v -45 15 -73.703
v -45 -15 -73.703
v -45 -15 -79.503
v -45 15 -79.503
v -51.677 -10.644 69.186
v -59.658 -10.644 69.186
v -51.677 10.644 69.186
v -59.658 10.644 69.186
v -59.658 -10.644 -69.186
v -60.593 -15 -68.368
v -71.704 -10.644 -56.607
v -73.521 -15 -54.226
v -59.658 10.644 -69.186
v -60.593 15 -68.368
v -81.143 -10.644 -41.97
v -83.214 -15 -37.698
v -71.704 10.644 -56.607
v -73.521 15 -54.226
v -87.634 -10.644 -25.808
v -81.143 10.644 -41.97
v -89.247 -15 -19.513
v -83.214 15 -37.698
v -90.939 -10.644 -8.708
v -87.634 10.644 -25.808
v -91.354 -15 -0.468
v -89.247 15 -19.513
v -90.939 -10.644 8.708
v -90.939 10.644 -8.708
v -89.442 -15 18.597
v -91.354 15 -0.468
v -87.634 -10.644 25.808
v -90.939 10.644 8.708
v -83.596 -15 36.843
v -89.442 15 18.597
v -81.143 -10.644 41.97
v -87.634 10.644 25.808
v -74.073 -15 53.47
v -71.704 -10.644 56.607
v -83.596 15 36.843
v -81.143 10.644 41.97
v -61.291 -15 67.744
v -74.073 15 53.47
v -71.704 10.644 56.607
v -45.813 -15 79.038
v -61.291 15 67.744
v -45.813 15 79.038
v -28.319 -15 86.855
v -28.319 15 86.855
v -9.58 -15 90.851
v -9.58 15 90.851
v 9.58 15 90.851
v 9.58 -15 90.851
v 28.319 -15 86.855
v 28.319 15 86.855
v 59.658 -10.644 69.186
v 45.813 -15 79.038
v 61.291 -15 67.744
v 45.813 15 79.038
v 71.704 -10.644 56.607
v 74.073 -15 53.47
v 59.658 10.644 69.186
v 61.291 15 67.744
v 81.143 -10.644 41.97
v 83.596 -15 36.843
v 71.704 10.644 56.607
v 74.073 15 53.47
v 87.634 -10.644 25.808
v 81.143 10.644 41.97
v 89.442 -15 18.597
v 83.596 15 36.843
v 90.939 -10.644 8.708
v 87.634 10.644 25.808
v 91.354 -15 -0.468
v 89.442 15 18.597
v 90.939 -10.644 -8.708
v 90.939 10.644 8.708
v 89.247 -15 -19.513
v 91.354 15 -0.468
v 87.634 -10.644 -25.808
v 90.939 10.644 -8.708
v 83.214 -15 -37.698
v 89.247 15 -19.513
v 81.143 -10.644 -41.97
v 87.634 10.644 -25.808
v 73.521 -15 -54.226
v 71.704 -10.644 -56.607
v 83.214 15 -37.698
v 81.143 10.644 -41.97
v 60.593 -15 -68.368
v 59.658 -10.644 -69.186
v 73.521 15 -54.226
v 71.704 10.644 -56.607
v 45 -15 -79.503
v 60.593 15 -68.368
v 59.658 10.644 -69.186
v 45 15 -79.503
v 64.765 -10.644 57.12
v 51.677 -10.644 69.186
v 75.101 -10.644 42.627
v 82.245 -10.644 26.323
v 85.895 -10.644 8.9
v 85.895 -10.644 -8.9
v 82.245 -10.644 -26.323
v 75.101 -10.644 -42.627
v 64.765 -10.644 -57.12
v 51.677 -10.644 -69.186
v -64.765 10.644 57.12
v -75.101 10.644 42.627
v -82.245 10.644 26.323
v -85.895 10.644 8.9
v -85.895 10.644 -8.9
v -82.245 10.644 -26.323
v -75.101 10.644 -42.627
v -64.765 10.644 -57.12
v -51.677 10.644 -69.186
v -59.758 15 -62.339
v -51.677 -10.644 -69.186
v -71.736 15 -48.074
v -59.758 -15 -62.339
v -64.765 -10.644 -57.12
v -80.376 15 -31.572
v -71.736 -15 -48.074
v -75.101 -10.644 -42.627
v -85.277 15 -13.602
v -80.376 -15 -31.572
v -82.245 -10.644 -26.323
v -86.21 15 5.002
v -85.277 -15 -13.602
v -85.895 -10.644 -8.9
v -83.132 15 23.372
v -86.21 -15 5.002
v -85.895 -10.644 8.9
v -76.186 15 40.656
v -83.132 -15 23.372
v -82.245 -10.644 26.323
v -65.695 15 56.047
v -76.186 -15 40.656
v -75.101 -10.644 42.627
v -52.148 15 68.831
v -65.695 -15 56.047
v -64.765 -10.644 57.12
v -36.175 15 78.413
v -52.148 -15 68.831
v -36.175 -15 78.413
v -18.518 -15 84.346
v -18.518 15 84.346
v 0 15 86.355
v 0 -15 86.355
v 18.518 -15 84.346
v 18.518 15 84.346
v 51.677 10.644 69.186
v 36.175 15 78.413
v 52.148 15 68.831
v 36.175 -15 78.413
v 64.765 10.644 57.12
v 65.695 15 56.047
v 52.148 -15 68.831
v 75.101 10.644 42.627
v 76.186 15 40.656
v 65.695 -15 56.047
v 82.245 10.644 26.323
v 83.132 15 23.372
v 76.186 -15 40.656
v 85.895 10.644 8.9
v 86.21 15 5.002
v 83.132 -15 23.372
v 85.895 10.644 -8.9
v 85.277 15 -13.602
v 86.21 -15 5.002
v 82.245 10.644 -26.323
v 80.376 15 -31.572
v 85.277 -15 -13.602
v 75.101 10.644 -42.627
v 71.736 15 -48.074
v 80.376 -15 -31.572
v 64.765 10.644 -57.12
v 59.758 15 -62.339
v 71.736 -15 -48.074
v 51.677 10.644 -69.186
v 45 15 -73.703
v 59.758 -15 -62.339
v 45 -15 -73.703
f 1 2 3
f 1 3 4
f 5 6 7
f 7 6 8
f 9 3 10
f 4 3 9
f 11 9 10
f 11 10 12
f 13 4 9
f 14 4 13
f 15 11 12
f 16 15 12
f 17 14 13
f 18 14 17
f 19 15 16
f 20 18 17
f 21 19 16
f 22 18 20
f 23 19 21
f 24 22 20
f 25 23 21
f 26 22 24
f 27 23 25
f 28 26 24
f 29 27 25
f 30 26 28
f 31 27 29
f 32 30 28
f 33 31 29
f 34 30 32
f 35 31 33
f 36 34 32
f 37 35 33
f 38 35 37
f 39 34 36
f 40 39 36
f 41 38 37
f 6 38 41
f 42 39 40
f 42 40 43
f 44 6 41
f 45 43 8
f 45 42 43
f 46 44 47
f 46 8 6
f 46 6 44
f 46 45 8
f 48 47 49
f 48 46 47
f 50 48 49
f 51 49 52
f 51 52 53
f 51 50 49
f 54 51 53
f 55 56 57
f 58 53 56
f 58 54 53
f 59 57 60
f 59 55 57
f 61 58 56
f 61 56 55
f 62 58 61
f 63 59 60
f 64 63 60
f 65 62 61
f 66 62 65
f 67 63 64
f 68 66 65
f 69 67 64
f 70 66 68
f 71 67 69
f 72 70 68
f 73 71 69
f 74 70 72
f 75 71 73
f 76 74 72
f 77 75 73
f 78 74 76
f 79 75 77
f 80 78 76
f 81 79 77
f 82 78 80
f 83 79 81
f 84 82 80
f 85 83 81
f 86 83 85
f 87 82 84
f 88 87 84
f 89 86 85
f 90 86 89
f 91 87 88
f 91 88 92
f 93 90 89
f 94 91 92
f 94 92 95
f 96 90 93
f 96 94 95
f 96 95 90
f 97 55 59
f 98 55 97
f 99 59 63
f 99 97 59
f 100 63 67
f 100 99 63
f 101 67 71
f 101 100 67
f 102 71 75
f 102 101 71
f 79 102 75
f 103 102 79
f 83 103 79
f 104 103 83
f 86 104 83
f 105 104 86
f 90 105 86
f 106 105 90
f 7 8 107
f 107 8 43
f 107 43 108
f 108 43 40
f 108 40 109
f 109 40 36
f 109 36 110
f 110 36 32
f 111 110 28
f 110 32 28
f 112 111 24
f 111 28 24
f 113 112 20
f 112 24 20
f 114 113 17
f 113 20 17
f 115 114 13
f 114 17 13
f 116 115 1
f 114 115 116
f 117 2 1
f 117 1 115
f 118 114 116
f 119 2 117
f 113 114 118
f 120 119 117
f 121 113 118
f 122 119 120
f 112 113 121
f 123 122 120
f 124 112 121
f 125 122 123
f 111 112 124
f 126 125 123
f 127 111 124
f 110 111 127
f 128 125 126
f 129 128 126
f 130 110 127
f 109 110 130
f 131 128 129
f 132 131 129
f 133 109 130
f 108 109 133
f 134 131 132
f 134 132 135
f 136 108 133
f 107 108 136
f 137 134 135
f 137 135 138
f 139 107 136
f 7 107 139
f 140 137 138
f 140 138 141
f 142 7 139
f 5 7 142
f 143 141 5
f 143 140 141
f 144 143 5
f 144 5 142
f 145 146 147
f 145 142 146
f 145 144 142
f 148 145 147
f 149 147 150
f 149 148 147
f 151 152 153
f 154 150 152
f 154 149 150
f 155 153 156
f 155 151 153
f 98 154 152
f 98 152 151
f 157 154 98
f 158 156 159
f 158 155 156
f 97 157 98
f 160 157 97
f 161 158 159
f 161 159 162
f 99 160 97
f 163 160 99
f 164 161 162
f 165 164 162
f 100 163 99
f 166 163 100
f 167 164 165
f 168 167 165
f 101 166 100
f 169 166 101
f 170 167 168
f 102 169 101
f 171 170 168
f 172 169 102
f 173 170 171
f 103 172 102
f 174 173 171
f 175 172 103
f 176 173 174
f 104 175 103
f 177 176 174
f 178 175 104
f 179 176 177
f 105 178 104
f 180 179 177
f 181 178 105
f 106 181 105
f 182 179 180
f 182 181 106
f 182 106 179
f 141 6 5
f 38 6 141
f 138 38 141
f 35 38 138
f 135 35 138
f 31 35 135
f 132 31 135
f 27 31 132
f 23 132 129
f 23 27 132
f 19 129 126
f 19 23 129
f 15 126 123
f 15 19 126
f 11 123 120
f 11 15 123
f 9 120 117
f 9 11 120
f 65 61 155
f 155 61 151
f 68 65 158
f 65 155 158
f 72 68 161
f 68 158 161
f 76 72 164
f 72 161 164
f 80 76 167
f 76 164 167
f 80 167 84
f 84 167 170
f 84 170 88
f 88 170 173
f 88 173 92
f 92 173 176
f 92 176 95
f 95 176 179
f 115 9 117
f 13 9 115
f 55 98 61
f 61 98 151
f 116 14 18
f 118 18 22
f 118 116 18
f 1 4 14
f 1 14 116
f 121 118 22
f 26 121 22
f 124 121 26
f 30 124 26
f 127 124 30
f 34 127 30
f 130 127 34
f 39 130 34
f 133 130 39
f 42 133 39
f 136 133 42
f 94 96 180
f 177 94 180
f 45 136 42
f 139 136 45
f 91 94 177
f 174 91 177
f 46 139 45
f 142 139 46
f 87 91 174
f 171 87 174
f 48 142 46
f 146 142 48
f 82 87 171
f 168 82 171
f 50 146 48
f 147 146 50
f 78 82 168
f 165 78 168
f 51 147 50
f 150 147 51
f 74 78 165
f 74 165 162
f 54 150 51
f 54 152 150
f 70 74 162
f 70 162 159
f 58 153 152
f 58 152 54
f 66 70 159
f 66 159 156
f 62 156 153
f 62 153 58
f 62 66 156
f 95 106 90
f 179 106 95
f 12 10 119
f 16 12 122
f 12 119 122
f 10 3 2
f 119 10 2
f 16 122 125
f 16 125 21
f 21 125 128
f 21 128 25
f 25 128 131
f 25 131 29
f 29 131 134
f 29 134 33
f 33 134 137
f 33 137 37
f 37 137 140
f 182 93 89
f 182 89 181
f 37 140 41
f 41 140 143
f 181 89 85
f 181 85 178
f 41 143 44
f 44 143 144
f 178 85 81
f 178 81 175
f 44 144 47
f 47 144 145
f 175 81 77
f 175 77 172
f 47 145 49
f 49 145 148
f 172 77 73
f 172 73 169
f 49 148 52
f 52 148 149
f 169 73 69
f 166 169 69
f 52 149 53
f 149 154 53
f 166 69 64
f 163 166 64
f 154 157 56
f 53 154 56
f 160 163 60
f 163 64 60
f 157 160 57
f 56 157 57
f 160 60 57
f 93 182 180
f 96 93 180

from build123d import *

# Parameters (mm, degrees)
SKETCH2_R               = 91.355
SKETCH2_R_2             = 86.355
BOSS_EXTRUDE1_DEPTH     = 15
SKETCH5_W               = 90
SKETCH5_H               = 30
CUT_EXTRUDE1_DEPTH      = 131.063338609
CUT_EXTRUDE2_DEPTH      = 131.063338609
CUT_EXTRUDE2_DEPTH_BACK = 131.063338609
SKETCH6_W               = 138.372037672
SKETCH6_H               = 21.288005796


with BuildPart() as part:
    # Sketch2 → Boss-Extrude1 (new, symmetric)
    with BuildSketch(Plane(origin=(0, 0, 0), x_dir=(1, 0, 0), z_dir=(0, 1, 0))):
        with Locations(Location((0, 0, 0), (0, 0, 270))):
            Circle(SKETCH2_R)
        with Locations(Location((0, 0, 0), (0, 0, 270))):
            Circle(SKETCH2_R_2, mode=Mode.SUBTRACT)
    extrude(amount=BOSS_EXTRUDE1_DEPTH, both=True)

    # Sketch5 → Cut-Extrude1 (cut, through all)
    with BuildSketch(Plane.XY):
        Rectangle(SKETCH5_W, SKETCH5_H)
    extrude(amount=-CUT_EXTRUDE1_DEPTH, mode=Mode.SUBTRACT)

    # Sketch6 → Cut-Extrude2 (cut, two sides: drawn at the far end of the back side and taken through both)
    with BuildSketch(Plane(origin=(0, 0, 0), x_dir=(0, 0, -1), z_dir=(1, 0, 0)).offset(-CUT_EXTRUDE2_DEPTH_BACK)):
        Rectangle(SKETCH6_W, SKETCH6_H)
    extrude(amount=CUT_EXTRUDE2_DEPTH + CUT_EXTRUDE2_DEPTH_BACK, mode=Mode.SUBTRACT)


solid = part.part
